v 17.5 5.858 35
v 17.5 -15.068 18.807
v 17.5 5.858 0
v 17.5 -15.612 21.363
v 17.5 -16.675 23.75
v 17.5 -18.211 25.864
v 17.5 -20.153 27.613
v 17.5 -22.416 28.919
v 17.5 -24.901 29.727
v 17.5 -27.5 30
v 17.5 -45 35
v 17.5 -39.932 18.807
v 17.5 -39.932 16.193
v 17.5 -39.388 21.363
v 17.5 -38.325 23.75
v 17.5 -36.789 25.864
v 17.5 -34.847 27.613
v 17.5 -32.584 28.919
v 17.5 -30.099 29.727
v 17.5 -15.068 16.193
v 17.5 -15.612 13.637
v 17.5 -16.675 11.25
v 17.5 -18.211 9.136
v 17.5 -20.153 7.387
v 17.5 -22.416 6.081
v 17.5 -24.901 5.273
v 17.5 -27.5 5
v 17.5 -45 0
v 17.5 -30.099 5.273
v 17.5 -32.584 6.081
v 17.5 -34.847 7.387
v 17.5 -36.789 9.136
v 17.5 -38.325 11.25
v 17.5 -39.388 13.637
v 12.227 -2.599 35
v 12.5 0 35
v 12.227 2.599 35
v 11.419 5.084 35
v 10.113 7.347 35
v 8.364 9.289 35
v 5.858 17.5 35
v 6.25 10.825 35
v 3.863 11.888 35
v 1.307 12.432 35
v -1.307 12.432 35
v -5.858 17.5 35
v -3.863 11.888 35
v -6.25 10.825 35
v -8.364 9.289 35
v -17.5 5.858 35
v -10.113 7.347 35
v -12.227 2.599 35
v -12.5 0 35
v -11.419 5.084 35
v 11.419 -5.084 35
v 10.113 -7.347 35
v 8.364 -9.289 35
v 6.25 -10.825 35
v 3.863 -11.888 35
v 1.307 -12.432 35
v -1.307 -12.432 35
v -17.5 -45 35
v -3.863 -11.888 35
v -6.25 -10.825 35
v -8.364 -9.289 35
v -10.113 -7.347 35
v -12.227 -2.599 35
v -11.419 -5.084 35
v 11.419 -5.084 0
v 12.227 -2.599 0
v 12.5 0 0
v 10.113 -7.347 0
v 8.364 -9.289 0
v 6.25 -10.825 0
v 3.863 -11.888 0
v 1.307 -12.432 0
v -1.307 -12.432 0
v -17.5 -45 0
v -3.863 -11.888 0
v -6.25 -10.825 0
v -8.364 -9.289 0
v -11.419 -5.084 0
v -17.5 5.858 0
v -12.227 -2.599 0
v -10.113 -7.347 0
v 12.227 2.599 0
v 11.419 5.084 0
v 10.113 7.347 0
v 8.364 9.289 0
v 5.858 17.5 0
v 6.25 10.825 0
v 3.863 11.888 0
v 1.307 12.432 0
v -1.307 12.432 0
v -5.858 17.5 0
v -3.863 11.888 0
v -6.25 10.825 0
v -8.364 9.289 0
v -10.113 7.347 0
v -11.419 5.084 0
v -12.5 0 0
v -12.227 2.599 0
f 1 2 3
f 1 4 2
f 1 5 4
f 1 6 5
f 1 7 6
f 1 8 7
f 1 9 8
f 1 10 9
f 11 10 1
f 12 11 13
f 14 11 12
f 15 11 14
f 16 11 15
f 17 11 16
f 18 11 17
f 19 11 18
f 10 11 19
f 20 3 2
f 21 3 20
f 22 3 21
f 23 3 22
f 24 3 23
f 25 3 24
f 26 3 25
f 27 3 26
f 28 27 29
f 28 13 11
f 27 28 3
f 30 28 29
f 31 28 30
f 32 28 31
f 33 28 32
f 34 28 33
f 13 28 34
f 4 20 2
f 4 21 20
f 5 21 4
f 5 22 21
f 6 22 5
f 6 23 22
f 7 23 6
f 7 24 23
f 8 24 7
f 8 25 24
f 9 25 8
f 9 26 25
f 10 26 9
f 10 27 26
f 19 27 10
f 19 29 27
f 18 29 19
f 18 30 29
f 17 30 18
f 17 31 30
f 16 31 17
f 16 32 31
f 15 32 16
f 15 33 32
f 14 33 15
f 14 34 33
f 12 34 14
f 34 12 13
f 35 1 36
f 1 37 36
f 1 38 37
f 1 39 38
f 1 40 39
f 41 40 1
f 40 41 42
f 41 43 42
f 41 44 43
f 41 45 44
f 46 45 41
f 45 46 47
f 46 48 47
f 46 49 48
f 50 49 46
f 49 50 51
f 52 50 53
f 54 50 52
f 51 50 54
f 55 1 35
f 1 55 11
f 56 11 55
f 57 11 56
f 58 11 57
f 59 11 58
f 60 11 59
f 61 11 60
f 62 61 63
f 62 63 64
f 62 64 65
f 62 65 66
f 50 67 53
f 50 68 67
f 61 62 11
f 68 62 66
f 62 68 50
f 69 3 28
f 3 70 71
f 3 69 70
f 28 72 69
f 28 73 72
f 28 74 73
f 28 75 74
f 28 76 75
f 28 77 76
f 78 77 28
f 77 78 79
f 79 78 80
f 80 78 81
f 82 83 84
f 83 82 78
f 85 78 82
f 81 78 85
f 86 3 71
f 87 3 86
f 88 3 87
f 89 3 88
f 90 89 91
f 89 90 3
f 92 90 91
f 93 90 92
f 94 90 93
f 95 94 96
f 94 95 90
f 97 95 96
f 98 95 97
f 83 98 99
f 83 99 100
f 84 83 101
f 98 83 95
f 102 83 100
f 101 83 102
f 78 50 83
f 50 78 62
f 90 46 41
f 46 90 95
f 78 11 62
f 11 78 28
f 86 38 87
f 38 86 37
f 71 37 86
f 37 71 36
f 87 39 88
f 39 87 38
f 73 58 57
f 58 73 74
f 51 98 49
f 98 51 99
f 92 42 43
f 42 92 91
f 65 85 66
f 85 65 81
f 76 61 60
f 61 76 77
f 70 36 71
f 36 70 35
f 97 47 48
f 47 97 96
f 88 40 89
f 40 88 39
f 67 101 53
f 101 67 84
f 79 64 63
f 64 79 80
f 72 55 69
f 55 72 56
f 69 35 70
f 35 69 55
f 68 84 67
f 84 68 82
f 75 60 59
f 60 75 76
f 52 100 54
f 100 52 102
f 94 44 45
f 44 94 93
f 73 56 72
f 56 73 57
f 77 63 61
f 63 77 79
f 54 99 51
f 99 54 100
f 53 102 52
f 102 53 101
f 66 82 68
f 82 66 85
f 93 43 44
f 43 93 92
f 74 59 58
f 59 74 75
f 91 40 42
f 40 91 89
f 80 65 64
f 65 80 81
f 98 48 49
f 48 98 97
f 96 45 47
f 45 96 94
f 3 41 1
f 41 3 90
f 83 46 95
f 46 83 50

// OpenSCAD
difference(){
translate([-17.5,-45,0])
cube([35,62.5,35]);
    translate([0,0,0])
    cylinder(h=35,r1=12.5,r2=12.5);
    translate([17.5,-27.5,17.5])
    rotate([0,90,0])
    cylinder(h=35,r1=12.5,r2=12.5);  
    translate([12.5,25,35])
    rotate([135,90,0])
    cube([35,17.5,10]);
    translate([-25,12.5,35])
    rotate([45,90,0])
    cube([35,17.5,10]);
   }
